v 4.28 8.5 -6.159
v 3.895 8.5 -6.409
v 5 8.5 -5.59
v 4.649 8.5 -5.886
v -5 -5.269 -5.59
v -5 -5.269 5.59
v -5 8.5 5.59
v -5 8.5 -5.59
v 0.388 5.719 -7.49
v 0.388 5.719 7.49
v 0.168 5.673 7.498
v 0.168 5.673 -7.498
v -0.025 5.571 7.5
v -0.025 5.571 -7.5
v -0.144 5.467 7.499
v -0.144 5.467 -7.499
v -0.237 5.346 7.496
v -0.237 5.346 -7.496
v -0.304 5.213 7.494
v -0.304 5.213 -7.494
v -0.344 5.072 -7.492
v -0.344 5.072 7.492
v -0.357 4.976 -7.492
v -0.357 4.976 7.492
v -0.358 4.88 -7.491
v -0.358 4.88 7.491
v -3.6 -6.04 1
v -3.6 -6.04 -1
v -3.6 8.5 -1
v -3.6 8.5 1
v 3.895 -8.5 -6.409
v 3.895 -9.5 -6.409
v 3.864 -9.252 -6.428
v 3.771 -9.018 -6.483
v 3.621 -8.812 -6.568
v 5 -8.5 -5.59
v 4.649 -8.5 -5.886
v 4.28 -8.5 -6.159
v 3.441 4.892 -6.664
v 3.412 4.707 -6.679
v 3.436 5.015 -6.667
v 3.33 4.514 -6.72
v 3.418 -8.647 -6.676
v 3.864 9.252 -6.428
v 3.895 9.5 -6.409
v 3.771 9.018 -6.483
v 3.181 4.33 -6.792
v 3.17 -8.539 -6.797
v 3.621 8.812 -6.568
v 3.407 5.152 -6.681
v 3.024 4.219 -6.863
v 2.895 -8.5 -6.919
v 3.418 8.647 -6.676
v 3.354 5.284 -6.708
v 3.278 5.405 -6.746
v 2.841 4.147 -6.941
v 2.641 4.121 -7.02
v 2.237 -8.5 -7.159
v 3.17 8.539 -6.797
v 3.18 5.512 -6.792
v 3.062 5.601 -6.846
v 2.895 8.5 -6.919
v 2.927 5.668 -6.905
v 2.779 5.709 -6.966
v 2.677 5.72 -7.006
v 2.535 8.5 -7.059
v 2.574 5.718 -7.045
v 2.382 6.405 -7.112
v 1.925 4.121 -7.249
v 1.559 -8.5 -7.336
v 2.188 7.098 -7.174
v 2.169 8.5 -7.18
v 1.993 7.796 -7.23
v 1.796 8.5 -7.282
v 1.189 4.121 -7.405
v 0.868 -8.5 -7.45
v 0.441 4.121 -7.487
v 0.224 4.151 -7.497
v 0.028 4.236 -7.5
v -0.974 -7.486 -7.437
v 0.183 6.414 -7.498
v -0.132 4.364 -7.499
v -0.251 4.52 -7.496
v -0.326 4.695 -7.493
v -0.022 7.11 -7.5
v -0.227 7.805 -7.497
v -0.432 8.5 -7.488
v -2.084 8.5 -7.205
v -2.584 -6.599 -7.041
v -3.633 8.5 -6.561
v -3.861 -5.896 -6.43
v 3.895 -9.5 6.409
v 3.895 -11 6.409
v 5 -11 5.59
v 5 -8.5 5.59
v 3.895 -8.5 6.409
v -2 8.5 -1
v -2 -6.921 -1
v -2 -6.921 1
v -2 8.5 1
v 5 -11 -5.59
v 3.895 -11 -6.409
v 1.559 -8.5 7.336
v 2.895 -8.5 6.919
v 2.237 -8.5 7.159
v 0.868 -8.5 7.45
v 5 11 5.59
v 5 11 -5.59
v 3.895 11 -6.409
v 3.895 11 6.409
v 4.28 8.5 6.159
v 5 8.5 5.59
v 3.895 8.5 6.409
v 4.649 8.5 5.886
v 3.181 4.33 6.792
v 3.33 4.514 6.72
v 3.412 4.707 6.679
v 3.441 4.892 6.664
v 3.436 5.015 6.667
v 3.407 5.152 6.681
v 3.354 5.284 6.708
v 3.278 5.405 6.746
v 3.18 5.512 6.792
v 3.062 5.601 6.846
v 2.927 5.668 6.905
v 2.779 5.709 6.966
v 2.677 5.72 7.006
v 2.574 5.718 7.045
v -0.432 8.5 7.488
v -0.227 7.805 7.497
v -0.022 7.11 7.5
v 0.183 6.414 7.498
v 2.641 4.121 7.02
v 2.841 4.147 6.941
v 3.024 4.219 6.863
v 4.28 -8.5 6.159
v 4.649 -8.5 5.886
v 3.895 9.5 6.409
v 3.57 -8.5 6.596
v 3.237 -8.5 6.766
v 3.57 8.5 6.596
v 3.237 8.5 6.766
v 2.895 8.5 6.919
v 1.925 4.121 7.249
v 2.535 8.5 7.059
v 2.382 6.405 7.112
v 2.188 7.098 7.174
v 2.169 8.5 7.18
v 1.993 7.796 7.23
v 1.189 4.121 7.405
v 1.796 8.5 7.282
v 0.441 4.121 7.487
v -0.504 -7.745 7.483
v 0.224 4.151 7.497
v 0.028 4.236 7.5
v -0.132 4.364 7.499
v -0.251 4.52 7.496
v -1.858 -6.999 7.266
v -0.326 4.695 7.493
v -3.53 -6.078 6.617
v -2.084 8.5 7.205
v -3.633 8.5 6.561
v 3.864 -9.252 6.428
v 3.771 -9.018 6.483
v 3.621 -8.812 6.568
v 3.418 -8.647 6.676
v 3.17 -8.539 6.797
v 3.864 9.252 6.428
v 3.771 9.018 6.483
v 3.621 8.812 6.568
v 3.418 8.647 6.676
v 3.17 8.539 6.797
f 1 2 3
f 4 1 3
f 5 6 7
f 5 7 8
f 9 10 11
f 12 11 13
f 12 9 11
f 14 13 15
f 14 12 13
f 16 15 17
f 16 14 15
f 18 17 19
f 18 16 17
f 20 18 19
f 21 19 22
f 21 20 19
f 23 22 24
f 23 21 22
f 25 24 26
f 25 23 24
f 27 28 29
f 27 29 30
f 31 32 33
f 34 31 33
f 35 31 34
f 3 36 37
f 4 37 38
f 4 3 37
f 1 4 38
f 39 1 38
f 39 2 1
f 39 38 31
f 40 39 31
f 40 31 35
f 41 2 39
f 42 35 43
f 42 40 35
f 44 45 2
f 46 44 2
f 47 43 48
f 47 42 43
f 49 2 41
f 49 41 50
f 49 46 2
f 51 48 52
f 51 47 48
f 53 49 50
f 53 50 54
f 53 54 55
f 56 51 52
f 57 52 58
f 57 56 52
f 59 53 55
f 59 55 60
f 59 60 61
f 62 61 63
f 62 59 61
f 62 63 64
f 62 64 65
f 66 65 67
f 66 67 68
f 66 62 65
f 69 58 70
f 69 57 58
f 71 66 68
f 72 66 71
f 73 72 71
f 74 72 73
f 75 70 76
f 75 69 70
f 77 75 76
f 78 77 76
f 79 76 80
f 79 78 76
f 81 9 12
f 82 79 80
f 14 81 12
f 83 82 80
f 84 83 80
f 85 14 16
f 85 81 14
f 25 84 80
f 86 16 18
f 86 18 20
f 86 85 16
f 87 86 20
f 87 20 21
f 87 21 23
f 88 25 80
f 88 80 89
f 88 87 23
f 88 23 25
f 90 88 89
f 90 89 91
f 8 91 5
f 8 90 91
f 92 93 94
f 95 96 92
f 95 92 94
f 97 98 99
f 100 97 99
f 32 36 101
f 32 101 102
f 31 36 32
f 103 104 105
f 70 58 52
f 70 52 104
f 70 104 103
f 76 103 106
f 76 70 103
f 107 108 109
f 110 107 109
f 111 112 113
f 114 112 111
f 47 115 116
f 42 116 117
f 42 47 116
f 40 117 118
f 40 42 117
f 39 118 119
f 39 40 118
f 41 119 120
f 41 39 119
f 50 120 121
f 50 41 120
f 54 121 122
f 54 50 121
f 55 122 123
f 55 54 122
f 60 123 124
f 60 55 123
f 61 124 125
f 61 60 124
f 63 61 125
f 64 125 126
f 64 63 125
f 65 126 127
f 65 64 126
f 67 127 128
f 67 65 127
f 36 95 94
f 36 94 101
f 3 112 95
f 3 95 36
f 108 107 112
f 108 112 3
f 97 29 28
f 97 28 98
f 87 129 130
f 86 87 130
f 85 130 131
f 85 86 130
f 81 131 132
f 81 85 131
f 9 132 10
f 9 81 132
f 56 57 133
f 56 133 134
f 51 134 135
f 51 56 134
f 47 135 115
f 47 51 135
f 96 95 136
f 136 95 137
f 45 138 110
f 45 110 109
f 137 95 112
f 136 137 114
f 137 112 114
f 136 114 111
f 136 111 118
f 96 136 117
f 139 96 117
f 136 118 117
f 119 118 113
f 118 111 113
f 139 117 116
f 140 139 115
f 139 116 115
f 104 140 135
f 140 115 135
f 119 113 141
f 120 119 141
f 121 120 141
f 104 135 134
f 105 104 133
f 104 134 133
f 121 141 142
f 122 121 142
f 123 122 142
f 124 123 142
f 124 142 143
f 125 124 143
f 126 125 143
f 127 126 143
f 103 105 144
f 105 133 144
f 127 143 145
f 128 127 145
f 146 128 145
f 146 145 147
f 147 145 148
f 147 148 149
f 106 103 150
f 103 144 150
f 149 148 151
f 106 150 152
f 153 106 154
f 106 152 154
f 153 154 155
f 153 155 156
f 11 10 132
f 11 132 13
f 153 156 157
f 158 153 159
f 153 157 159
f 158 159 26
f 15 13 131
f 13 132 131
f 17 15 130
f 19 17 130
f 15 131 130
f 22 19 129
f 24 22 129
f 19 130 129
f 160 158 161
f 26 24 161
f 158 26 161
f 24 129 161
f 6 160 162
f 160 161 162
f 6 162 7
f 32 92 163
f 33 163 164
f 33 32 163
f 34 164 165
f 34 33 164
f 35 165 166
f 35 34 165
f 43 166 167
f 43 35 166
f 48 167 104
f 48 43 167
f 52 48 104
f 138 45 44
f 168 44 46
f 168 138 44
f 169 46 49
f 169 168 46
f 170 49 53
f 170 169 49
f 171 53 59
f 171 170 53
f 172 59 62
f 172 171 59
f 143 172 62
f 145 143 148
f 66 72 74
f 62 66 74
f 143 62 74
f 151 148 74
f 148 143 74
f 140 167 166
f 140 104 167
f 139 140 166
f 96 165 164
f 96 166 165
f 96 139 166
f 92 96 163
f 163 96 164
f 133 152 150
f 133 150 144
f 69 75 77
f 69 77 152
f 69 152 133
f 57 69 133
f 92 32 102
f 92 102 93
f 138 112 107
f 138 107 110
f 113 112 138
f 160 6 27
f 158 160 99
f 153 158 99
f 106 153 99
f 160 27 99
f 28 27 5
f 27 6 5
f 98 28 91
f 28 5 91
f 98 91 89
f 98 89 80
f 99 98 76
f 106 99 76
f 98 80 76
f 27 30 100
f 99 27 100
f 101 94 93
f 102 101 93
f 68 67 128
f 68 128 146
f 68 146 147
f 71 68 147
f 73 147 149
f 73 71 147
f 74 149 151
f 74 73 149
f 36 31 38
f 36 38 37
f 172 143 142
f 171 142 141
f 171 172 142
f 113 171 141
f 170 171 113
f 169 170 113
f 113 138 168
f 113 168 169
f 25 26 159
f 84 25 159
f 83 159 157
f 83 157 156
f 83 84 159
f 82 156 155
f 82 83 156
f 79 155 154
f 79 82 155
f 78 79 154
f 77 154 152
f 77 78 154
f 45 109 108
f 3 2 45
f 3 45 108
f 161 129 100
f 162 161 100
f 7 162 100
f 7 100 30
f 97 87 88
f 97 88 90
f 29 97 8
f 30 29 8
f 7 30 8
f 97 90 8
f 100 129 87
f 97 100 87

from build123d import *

# Parameters (mm, degrees)
SKETCH1_W               = 7.5
SKETCH1_H               = 17
CUT_EXTRUDE1_START      = -20
CUT_EXTRUDE1_DEPTH      = 20
SKETCH4_W               = 1.6
SKETCH4_H               = 2
CUT_EXTRUDE2_DEPTH      = 20
CUT_EXTRUDE3_DEPTH      = 13.389511693
CUT_EXTRUDE3_DEPTH_BACK = 13.389511693
CUT_EXTRUDE4_DEPTH      = 13.389511863
CUT_EXTRUDE4_DEPTH_BACK = 13.389511863
BOSS_EXTRUDE4_DEPTH     = 2.5
FILLET1_R               = 1
BOSS_EXTRUDE7_DEPTH     = 2.5
FILLET5_R               = 1


with BuildPart() as part:
    # Sketch1 → Revolve1 (revolve)
    with BuildSketch(Plane.XY):
        with Locations((-3.75, 0)):
            Rectangle(SKETCH1_W, SKETCH1_H)
    revolve(axis=Axis((0, 8.5, 0), (0, -1, 0)))

    # Sketch2 → Cut-Extrude1 (cut)
    with BuildSketch(Plane.XZ.offset(8.5).offset(CUT_EXTRUDE1_START)):
        with BuildLine():
            Line((-5, 5.590169944), (-5, -5.590169944))
            ThreePointArc((-5, -5.590169944), (-7.5, 0), (-5, 5.590169944))
        make_face()
    cut_extrude1 = extrude(amount=CUT_EXTRUDE1_DEPTH, mode=Mode.SUBTRACT)

    # Sketch4 → Cut-Extrude2 (cut)
    with BuildSketch(Plane.XZ.offset(8.5)):
        with Locations((-2.8, 0)):
            Rectangle(SKETCH4_W, SKETCH4_H)
    extrude(amount=-CUT_EXTRUDE2_DEPTH, mode=Mode.SUBTRACT)

    # Mirror1: Cut-Extrude1 across plane
    add(cut_extrude1.mirror(Plane(origin=(0, 0, 0), x_dir=(0, 0, 1), z_dir=(1, 0, 0))), mode=Mode.SUBTRACT)

    # Sketch7 → Cut-Extrude3 (cut, two sides: drawn at the far end of the back side and taken through both)
    with BuildSketch(Plane.XY.offset(-CUT_EXTRUDE3_DEPTH_BACK)):
        with BuildLine():
            Line((0.441294084, 4.12121402), (2.641294084, 4.12121402))
            ThreePointArc((2.641294084, 4.12121402), (2.930486649, 4.17531345), (3.180566332, 4.330294869))
            ThreePointArc((3.180566332, 4.330294869), (3.374330031, 5.241617362), (2.573852958, 5.718366261))
            Line((2.573852958, 5.718366261), (1.796324142, 8.5))
            Line((1.796324142, 8.5), (-0.431632782, 8.5))
            Line((-0.431632782, 8.5), (0.38797004, 5.719434883))
            ThreePointArc((0.38797004, 5.719434883), (-0.156844774, 5.452467167), (-0.357641011, 4.879950081))
            ThreePointArc((-0.357641011, 4.879950081), (-0.109609196, 4.341123014), (0.441294084, 4.12121402))
        make_face()
    extrude(amount=CUT_EXTRUDE3_DEPTH + CUT_EXTRUDE3_DEPTH_BACK, mode=Mode.SUBTRACT)

    # Sketch8 → Cut-Extrude4 (cut, two sides: drawn at the far end of the back side and taken through both)
    with BuildSketch(Plane.XY.offset(-CUT_EXTRUDE4_DEPTH_BACK)):
        Polygon((-5, -5.268946984), (0.867668731, -8.5), (-5, -8.5), align=None)
    extrude(amount=CUT_EXTRUDE4_DEPTH + CUT_EXTRUDE4_DEPTH_BACK, mode=Mode.SUBTRACT)

    # Sketch13 → Boss-Extrude4 (add)
    with BuildSketch(Plane(origin=(0, 8.5, 0), x_dir=(1, 0, 0), z_dir=(0, 1, 0))):
        Polygon((5, 5.590169944), (5, -5.590169944), (3.894868524, -6.40936808), (3.894868524, 6.40936808), align=None)
    extrude(amount=BOSS_EXTRUDE4_DEPTH)

    # Fillet1
    # the kernel refuses this fillet: 1 mm, written as the material it adds along each edge
    with BuildSketch(Plane(origin=(3.894868524, 8.5, 8.90936808), x_dir=(-1, 0, 0), z_dir=(0, 0, -1))) as fillet1_piece_1_section:
        with BuildLine():
            CenterArc((FILLET1_R, FILLET1_R), FILLET1_R, 180, 90)
            Line((0, FILLET1_R), (0, 0))
            Line((0, 0), (FILLET1_R, 0))
        make_face()
    fillet1_piece_1 = extrude(amount=17.81873616, mode=Mode.PRIVATE)
    fillet1_piece_1 = fillet1_piece_1 & Plane(origin=(0, 8.724088474, 0), x_dir=(-1, 0, 0), z_dir=(0, 1, 0)) * Cylinder(7.5, 40, mode=Mode.PRIVATE)
    fillet1_piece_1 = split(fillet1_piece_1, bisect_by=Plane(origin=(6.812525482, 8.724088474, 4.246603564), z_dir=(-0.5955008037670206, -6.20137611558393e-15, -0.8033547116391566)), keep=Keep.TOP, mode=Mode.PRIVATE)
    add(fillet1_piece_1)

    # Sketch15 → Boss-Extrude7 (add)
    with BuildSketch(Plane.XZ.offset(8.5)):
        Polygon((5, 5.590169944), (5, -5.590169944), (3.894868524, -6.40936808), (3.894868524, 6.40936808), align=None)
    extrude(amount=BOSS_EXTRUDE7_DEPTH)

    # Fillet5
    # the kernel refuses this fillet: 1 mm, written as the material it adds along each edge
    with BuildSketch(Plane(origin=(3.894868524, -8.5, -8.90936808), x_dir=(-1, 0, 0), z_dir=(0, 0, 1))) as fillet5_piece_1_section:
        with BuildLine():
            CenterArc((FILLET5_R, FILLET5_R), FILLET5_R, 180, 90)
            Line((0, FILLET5_R), (0, 0))
            Line((0, 0), (FILLET5_R, 0))
        make_face()
    fillet5_piece_1 = extrude(amount=17.81873616, mode=Mode.PRIVATE)
    fillet5_piece_1 = fillet5_piece_1 & Plane(origin=(0, -8.724088474, 0), x_dir=(-1, 0, 0), z_dir=(0, 1, 0)) * Cylinder(7.5, 40, mode=Mode.PRIVATE)
    fillet5_piece_1 = split(fillet5_piece_1, bisect_by=Plane(origin=(6.812525482, -8.724088474, -4.246603564), z_dir=(-0.5955008037671681, -6.201376115585466e-15, 0.8033547116390474)), keep=Keep.TOP, mode=Mode.PRIVATE)
    add(fillet5_piece_1)


solid = part.part
